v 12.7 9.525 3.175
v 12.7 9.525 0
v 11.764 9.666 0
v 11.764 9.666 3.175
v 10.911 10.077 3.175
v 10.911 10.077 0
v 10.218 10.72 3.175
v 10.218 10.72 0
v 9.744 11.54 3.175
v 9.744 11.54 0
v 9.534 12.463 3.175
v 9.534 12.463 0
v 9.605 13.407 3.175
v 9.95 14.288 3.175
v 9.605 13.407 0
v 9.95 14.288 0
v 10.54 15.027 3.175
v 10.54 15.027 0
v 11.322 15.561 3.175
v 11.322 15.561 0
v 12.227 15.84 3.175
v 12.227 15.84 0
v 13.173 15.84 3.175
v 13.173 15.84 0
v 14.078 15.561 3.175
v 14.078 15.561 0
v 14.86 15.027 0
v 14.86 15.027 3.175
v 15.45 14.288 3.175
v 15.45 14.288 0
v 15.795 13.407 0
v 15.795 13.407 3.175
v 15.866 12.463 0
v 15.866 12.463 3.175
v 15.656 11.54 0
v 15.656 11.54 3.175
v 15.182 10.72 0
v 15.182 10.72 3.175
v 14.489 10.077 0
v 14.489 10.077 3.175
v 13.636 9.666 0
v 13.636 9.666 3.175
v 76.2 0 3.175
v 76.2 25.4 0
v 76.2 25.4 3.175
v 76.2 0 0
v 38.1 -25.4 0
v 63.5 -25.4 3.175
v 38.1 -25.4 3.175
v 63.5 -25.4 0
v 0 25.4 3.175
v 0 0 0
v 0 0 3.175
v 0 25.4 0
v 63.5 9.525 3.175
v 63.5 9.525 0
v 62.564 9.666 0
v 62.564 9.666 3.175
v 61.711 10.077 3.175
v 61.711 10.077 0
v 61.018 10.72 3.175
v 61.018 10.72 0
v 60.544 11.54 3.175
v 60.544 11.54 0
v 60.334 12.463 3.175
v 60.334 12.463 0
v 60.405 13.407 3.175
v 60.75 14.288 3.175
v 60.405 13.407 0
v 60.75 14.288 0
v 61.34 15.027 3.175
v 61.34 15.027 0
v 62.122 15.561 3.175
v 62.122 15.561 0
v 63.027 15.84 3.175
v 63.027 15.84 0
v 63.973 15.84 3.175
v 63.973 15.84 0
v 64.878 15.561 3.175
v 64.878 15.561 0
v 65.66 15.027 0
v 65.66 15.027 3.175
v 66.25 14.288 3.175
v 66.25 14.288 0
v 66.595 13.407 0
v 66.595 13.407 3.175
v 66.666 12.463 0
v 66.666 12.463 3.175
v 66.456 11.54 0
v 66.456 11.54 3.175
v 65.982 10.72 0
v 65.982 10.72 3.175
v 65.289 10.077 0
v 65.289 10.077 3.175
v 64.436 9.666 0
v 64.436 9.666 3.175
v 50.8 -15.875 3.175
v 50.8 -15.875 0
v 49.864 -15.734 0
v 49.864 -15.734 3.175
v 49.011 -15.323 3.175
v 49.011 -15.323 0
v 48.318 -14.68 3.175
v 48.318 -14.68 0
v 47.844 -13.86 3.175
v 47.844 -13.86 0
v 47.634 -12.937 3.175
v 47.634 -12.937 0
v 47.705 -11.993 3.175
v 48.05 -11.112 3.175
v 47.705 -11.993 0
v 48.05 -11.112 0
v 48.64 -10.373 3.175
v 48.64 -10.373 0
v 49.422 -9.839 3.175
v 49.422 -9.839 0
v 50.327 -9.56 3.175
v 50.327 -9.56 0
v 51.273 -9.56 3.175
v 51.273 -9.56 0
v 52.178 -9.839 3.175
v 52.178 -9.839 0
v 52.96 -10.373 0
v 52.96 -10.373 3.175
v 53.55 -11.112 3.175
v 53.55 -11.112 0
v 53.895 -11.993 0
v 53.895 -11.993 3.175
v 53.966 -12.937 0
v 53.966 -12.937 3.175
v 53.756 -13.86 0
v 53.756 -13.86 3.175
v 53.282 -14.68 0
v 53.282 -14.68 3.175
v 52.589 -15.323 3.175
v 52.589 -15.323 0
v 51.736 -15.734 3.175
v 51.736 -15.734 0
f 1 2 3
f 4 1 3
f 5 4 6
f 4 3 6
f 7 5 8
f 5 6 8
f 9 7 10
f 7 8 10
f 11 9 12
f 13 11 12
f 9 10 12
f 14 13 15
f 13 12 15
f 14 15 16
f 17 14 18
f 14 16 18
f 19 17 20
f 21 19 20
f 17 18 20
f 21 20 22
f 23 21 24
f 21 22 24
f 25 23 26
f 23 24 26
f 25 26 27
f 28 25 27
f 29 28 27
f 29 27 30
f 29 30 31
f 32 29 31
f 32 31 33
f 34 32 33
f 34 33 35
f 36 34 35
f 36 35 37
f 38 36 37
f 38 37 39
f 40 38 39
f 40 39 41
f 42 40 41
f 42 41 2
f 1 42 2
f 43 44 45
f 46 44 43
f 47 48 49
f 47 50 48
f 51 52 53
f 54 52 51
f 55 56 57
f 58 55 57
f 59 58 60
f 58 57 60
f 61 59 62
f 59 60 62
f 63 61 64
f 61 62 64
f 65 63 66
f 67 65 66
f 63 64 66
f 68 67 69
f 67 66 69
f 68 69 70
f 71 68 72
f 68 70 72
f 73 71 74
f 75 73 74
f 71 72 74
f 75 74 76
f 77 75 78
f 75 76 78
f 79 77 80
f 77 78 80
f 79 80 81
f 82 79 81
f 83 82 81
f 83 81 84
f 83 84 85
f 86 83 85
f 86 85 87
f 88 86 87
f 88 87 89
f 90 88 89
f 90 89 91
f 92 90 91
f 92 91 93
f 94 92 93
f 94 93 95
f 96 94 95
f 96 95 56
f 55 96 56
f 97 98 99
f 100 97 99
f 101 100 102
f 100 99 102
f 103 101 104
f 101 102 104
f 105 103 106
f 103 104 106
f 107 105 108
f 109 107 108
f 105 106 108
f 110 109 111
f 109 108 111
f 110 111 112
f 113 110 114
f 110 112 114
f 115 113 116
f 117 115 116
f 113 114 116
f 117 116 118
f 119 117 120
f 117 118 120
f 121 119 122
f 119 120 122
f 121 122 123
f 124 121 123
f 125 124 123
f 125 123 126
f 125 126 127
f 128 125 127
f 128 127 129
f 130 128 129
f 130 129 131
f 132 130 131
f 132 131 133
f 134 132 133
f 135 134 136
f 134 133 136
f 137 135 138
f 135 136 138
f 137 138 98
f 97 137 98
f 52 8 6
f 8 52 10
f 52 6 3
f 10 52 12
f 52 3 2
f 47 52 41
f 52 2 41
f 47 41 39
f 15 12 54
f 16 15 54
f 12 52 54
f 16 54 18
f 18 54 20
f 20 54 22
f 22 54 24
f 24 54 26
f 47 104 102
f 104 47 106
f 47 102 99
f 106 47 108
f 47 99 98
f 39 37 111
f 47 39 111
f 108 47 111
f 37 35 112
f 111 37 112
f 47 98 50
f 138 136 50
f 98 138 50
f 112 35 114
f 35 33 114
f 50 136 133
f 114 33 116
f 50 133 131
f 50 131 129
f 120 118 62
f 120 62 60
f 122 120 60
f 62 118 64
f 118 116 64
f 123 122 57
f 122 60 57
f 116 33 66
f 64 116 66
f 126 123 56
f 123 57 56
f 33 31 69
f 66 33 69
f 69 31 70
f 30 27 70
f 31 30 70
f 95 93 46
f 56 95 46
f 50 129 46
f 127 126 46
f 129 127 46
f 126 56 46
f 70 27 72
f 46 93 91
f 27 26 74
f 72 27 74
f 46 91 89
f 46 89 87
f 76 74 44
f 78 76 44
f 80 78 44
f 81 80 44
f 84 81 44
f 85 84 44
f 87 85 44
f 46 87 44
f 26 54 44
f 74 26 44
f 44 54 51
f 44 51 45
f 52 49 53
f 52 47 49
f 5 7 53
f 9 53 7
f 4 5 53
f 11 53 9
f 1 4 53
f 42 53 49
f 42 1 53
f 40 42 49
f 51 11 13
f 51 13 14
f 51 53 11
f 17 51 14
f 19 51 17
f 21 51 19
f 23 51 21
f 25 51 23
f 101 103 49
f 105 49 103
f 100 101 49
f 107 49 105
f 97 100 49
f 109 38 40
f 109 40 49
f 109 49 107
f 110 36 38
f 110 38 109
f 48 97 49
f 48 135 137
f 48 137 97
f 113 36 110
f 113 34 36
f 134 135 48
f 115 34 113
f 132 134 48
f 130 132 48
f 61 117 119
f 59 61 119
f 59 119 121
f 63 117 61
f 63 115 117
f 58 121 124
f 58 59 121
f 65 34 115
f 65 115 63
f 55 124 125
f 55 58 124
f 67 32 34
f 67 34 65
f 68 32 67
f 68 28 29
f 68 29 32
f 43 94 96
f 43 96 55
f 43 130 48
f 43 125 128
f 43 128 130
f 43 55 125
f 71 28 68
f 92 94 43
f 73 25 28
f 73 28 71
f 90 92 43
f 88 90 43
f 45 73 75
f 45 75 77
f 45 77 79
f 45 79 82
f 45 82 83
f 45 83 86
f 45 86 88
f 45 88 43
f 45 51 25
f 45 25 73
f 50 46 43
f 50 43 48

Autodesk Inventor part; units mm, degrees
ref_plane "YZ Plane" through (0, 0, 0) normal (1, 0, 0) x (0, 1, 0)
ref_plane "XZ Plane" through (0, 0, 0) normal (0, 1, 0) x (-1, 0, 0)
ref_plane "XY Plane" through (0, 0, 0) normal (0, 0, 1) x (1, 0, 0)
sketch "Sketch1" plane through (0, 0, 0) normal (0, 0, 1) x (1, 0, 0)
  line L0 (0, 0) -> (0, 25.4)
  line L1 (0, 25.4) -> (76.2, 25.4)
  line L2 (76.2, 25.4) -> (76.2, 0)
  line L3 (76.2, 0) -> (63.5, -25.4)
  line L4 (63.5, -25.4) -> (38.1, -25.4)
  line L5 (38.1, -25.4) -> (0, 0)
  dimension "d1" = 25.4
  dimension "d2" = 25.4
  dimension "d3" = 25.4
  dimension "d4" = 76.2
  dimension "d5" = 50.8
  dimension "d6" = 38.1
extrude "Extrusion1" add sketch "Sketch1" along normal blind 3.175
sketch "Sketch2" plane through (0, 0, 3.175) normal (0, 0, 1) x (1, 0, 0)
  line L0 (0, 25.4) -> (0, 0) projected
  line L1 (38.1, -25.4) -> (63.5, -25.4) projected
  line L2 (76.2, -25.4) -> (76.2, 25.4) projected
  line L3 (76.2, 25.4) -> (0, 25.4) projected
  point P0 (76.2, 0)
  point P1 (12.7, 12.7)
  point P2 (63.5, 12.7)
  point P3 (50.8, -12.7)
  dimension "d9" = 12.7
  dimension "d10" = 12.7
  dimension "d11" = 12.7
  dimension "d12" = 12.7
  dimension "d13" = 12.7
  dimension "d14" = 12.7
  dimension "d22" = 52.3634
hole "Hole1" at (12.7, 12.7, 3.175) at (63.5, 12.7, 3.175) at (50.8, -12.7, 3.175) direction (0, 0, -1) diameter 6.35 end through all
properties part number "TriangleBracket" material "Aluminum 6061"
